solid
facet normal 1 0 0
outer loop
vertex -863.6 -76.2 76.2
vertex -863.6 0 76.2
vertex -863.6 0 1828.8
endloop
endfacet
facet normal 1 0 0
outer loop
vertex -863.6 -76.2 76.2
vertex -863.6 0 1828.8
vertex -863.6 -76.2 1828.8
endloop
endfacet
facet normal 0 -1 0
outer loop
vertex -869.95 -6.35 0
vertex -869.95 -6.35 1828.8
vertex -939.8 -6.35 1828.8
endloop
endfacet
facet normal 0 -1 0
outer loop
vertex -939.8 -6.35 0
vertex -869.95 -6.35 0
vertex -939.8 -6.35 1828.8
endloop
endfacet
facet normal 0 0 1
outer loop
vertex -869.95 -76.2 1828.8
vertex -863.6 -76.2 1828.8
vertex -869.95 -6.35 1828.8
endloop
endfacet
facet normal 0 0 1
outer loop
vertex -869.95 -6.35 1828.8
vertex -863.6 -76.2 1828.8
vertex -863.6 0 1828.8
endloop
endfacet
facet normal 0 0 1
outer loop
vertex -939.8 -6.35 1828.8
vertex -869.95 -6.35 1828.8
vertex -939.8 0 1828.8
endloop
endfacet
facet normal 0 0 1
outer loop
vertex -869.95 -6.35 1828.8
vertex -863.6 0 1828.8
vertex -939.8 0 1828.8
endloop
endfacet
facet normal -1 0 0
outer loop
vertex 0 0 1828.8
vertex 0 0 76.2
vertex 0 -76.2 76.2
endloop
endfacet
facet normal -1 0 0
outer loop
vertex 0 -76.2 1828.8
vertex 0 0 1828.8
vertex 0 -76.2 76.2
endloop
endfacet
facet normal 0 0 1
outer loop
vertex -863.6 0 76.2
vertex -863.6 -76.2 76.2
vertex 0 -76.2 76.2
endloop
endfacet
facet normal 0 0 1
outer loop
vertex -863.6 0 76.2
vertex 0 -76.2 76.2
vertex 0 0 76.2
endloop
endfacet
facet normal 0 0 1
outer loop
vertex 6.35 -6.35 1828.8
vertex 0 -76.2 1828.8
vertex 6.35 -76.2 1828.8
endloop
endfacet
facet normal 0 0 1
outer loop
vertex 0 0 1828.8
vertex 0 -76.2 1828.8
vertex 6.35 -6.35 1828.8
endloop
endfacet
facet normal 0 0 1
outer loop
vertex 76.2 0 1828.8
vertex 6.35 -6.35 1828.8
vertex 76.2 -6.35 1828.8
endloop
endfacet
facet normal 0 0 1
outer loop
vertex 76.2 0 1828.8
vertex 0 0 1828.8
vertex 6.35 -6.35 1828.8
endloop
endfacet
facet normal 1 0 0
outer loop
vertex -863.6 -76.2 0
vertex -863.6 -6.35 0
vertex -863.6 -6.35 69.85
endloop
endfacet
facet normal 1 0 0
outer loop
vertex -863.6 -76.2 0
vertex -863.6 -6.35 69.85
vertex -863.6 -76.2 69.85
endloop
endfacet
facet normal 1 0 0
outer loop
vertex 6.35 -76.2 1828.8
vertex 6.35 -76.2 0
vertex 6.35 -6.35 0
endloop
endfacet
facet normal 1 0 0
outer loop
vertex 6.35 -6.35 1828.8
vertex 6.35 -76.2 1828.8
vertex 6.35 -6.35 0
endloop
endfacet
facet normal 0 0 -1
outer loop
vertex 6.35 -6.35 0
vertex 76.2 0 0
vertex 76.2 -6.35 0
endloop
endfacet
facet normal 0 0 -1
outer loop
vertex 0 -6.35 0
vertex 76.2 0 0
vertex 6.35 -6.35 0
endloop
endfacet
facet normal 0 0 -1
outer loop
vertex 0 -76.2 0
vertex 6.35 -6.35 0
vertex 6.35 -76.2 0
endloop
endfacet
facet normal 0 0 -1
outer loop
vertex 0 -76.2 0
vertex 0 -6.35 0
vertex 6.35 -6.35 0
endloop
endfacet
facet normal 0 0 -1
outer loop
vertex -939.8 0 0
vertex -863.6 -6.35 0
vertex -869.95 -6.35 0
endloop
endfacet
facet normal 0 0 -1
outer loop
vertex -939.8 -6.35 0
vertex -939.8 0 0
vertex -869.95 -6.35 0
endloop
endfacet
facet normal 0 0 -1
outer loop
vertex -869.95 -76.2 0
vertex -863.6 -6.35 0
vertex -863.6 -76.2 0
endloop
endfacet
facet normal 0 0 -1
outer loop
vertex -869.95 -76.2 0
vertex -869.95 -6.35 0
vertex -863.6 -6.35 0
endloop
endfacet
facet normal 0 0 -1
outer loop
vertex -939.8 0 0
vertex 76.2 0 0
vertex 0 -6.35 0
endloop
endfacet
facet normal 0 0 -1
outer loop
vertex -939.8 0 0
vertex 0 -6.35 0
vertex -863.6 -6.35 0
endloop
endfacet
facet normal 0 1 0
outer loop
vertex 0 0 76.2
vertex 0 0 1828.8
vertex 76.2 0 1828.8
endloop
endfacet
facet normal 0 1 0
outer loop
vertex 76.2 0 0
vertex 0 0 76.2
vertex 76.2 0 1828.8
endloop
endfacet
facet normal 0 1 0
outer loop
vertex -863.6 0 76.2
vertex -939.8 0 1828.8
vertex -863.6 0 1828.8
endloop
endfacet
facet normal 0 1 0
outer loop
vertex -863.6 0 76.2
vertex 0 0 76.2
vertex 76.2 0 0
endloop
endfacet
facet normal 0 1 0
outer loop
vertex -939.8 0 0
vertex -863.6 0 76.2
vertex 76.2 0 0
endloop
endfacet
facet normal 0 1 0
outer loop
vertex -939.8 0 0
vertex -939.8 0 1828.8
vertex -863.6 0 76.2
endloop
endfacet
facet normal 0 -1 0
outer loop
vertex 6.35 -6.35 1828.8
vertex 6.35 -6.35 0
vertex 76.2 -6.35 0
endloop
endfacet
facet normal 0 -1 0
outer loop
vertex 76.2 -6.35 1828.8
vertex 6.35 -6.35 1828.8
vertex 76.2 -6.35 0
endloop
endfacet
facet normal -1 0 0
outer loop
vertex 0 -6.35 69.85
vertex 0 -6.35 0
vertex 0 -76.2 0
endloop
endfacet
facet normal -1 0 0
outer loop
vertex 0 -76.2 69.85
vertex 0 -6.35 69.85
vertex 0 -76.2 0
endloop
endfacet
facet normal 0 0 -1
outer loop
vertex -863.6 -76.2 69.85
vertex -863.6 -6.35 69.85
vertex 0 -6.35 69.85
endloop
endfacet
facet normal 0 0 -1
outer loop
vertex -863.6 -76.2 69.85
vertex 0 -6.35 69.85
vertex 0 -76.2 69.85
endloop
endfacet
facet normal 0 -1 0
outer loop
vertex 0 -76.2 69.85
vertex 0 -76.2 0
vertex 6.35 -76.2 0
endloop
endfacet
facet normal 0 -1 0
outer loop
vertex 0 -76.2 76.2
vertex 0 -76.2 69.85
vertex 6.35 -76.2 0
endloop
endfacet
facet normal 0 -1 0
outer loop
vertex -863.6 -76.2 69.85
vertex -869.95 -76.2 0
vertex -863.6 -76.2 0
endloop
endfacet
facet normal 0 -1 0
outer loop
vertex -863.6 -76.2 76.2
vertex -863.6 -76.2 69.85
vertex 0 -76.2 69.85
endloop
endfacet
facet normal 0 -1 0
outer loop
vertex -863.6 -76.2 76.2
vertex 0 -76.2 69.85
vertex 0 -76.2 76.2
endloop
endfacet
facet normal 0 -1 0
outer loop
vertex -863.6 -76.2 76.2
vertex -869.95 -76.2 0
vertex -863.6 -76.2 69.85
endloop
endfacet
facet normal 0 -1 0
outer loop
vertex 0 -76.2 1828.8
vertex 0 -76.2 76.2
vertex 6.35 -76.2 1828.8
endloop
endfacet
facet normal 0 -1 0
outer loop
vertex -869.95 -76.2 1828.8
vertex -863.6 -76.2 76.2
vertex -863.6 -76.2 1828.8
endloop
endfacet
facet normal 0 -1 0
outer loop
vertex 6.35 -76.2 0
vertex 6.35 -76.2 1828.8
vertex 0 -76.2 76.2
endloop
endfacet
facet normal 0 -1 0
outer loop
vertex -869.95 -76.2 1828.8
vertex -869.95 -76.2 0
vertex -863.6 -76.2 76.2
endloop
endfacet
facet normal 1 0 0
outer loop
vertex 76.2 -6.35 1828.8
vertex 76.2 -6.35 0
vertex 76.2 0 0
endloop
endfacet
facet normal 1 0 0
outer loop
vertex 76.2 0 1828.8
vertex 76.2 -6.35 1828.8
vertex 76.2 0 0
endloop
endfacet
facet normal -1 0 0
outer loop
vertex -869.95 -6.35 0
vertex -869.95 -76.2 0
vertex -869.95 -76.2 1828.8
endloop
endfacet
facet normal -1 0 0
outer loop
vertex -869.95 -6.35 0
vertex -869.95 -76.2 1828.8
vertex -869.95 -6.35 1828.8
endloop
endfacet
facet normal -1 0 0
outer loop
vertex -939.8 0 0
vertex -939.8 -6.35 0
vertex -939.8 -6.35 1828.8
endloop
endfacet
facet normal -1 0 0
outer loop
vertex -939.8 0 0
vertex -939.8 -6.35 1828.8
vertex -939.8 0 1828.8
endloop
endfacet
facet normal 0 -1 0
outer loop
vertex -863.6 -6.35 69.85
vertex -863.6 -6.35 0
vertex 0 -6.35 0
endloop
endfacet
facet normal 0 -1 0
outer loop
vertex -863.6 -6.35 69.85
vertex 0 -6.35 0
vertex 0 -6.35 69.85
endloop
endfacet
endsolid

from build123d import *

# Parameters (mm, degrees)
F1_DEPTH = 1828.8
F3_DEPTH = 431.8


with BuildPart() as f1:
    # F0 (on Top) → F1 (new body)
    with BuildSketch(Plane.XY):
        Polygon((0, 0), (0, -76.2), (6.35, -76.2), (6.35, -6.35), (76.2, -6.35), (76.2, 0), align=None)
    extrude(amount=F1_DEPTH)

    # F2 (on face) → F3 (join)
    with BuildSketch(Plane(origin=(0, 0, 0), x_dir=(0, -1, 0), z_dir=(-1, 0, 0))):
        Polygon((0, 76.2), (0, 0), (6.35, 0), (6.35, 69.85), (76.2, 69.85), (76.2, 76.2), align=None)
    extrude(amount=F3_DEPTH)

    # F4: F1 across face


with BuildPart() as f1_1:
    add(f1.part)
    add(f1.part.mirror(Plane(origin=(-431.8, -21.396739, 54.803261), x_dir=(0, -1, 0), z_dir=(-1, 0, 0))))


solid = f1_1.part
